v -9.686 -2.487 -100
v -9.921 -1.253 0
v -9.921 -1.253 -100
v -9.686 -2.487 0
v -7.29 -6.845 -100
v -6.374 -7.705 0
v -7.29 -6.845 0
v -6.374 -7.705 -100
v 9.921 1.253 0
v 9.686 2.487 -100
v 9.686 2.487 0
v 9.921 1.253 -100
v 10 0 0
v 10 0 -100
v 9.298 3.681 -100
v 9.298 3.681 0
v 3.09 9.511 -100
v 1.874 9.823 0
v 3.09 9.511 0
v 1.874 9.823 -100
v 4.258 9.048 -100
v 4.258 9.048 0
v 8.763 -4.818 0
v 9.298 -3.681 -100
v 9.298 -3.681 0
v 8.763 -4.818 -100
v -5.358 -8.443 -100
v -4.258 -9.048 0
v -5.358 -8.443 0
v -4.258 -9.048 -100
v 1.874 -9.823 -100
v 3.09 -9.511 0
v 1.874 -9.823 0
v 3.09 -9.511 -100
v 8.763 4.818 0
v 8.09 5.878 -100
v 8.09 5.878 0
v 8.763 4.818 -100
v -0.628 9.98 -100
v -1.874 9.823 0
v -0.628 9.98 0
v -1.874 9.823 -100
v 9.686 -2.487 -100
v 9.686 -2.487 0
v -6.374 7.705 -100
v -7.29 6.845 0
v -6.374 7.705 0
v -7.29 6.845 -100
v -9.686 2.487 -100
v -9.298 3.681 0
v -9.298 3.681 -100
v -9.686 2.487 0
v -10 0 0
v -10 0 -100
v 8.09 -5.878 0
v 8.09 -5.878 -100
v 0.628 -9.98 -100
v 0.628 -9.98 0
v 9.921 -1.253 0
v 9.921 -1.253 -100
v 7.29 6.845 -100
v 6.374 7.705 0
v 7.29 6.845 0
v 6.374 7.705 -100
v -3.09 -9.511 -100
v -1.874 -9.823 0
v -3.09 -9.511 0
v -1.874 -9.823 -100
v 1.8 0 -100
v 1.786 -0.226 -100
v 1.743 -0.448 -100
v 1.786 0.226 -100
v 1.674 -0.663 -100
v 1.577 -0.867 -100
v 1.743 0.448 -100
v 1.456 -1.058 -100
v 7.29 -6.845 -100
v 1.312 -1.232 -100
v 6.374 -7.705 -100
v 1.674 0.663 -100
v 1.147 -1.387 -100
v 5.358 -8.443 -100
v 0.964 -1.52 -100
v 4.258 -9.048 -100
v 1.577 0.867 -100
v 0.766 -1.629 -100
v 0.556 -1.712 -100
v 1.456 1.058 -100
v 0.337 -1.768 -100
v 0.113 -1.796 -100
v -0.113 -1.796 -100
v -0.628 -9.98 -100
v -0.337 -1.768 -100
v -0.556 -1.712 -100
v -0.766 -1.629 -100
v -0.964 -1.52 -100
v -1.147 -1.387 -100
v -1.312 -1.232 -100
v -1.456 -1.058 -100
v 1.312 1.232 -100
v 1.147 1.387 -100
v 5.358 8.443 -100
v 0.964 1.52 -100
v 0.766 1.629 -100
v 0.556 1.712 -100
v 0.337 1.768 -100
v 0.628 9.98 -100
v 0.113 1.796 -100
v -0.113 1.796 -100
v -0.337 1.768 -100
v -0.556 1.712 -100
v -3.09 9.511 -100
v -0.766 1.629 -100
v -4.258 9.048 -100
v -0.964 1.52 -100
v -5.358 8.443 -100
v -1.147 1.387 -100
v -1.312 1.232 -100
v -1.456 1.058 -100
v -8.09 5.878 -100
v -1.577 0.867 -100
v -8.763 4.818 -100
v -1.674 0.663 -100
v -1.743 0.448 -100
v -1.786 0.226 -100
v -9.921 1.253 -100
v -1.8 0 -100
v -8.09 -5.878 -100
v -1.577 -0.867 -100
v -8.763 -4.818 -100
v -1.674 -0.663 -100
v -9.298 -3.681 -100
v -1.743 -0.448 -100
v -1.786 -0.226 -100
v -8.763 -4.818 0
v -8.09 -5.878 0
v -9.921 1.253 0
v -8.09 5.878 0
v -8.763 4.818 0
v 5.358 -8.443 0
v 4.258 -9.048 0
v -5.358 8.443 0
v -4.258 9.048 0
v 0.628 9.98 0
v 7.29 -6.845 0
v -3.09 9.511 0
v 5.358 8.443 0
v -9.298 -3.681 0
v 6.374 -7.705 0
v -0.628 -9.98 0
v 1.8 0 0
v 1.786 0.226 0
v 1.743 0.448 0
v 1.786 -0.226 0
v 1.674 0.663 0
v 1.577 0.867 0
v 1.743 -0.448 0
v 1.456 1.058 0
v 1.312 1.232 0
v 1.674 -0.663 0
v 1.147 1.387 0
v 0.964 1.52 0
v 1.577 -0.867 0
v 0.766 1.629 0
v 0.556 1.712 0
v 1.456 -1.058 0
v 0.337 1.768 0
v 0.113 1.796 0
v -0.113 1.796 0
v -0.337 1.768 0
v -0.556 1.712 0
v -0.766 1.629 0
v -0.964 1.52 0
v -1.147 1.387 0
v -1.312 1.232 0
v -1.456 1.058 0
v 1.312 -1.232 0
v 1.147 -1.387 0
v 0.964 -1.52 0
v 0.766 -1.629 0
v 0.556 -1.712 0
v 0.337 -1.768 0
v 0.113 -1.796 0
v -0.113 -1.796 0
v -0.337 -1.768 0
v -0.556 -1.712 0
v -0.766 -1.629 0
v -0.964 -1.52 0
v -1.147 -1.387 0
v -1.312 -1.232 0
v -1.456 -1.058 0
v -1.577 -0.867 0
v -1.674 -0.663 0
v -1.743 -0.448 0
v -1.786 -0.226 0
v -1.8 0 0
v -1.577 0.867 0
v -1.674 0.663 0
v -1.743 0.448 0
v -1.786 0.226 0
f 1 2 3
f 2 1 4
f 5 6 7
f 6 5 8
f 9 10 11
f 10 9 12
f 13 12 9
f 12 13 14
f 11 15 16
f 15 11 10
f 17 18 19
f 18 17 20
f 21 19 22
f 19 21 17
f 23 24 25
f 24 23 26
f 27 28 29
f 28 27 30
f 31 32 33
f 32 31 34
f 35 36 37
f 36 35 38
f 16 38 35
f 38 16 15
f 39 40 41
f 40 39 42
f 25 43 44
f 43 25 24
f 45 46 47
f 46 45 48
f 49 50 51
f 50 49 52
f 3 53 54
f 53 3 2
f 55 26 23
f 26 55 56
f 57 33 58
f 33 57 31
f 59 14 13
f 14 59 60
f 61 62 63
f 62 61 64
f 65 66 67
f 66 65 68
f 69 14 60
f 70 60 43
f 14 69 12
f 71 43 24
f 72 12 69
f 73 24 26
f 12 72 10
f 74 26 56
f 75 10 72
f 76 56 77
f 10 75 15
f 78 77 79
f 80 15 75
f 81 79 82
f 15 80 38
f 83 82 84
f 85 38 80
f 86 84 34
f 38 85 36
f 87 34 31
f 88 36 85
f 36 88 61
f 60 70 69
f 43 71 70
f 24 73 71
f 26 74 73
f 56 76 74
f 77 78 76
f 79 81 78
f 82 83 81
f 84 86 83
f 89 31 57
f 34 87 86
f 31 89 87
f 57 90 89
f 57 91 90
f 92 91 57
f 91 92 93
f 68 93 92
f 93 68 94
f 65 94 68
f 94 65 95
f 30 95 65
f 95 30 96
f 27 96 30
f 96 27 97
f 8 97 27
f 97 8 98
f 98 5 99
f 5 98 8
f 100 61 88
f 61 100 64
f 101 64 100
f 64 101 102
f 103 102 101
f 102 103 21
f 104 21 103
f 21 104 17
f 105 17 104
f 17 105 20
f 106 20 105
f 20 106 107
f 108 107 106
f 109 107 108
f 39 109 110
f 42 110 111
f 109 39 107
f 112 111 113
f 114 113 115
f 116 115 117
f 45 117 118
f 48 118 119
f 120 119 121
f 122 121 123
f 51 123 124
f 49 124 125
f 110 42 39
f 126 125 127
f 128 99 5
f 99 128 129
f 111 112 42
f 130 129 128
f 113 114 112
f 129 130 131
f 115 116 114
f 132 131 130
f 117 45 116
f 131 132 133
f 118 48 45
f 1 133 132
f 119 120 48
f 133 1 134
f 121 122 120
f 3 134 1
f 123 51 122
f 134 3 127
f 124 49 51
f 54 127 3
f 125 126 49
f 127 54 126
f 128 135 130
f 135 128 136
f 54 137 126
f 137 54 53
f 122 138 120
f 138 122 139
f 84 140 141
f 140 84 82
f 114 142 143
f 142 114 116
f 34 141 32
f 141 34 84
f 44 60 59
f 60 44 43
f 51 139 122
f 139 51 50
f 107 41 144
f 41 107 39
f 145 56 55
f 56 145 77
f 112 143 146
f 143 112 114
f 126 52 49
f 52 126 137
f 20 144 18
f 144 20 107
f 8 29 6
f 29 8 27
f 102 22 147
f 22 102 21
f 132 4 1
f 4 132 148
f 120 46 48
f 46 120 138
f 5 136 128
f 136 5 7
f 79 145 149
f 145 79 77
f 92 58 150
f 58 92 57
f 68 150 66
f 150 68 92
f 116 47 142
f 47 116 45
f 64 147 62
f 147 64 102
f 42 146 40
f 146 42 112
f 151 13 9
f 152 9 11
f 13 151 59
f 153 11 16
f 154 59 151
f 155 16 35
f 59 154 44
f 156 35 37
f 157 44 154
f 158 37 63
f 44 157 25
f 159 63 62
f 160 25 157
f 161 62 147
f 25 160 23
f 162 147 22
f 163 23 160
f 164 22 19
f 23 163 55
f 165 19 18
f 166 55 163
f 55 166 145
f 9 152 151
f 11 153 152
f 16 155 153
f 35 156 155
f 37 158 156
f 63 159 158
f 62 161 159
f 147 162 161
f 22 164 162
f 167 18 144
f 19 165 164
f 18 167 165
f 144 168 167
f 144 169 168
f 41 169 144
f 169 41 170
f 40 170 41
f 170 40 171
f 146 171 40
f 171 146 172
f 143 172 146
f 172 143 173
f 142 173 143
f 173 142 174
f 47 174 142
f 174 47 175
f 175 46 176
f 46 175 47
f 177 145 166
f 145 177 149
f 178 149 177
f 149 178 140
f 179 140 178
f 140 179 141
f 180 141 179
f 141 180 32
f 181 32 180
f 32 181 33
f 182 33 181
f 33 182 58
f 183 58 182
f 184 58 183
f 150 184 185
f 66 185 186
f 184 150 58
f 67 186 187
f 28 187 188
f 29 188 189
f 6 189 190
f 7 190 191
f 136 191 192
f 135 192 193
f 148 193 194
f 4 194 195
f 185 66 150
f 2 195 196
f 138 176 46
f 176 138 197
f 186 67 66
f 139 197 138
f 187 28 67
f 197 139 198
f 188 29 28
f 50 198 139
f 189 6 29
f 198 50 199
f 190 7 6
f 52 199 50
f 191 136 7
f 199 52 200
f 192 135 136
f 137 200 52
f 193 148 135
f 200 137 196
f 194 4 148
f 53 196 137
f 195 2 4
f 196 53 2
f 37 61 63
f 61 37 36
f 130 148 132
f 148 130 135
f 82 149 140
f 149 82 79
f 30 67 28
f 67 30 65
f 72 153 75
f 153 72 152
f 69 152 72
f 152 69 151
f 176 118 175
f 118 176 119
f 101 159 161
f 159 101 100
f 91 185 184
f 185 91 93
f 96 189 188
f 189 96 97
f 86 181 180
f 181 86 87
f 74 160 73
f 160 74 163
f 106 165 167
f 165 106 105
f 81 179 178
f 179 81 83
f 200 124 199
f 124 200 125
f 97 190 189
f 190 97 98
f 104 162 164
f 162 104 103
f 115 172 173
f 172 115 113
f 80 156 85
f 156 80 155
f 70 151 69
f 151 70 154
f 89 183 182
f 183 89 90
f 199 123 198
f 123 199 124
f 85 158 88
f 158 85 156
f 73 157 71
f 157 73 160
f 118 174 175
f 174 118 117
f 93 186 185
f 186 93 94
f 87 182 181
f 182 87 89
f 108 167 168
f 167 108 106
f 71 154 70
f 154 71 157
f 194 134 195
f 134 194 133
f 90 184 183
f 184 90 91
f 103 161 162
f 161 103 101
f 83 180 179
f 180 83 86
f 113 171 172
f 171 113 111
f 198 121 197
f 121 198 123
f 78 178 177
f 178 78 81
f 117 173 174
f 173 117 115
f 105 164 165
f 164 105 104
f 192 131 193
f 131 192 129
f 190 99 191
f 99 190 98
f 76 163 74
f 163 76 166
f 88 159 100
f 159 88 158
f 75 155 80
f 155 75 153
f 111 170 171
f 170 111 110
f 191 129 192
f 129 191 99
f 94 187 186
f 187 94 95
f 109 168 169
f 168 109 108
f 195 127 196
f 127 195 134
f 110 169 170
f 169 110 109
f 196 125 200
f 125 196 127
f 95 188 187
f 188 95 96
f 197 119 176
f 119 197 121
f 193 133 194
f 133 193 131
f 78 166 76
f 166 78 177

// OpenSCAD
$fn = 50;


difference() {
	union() {
		translate(v = [0, 0, -100.0000000000]) {
			cylinder(h = 100, r = 10.0000000000);
		}
		cylinder(h = 0, r = 13.0000000000);
	}
	union() {
		#translate(v = [0, 0, -100]) {
			cylinder(h = 100, r = 1.8000000000);
		}
	}
}
